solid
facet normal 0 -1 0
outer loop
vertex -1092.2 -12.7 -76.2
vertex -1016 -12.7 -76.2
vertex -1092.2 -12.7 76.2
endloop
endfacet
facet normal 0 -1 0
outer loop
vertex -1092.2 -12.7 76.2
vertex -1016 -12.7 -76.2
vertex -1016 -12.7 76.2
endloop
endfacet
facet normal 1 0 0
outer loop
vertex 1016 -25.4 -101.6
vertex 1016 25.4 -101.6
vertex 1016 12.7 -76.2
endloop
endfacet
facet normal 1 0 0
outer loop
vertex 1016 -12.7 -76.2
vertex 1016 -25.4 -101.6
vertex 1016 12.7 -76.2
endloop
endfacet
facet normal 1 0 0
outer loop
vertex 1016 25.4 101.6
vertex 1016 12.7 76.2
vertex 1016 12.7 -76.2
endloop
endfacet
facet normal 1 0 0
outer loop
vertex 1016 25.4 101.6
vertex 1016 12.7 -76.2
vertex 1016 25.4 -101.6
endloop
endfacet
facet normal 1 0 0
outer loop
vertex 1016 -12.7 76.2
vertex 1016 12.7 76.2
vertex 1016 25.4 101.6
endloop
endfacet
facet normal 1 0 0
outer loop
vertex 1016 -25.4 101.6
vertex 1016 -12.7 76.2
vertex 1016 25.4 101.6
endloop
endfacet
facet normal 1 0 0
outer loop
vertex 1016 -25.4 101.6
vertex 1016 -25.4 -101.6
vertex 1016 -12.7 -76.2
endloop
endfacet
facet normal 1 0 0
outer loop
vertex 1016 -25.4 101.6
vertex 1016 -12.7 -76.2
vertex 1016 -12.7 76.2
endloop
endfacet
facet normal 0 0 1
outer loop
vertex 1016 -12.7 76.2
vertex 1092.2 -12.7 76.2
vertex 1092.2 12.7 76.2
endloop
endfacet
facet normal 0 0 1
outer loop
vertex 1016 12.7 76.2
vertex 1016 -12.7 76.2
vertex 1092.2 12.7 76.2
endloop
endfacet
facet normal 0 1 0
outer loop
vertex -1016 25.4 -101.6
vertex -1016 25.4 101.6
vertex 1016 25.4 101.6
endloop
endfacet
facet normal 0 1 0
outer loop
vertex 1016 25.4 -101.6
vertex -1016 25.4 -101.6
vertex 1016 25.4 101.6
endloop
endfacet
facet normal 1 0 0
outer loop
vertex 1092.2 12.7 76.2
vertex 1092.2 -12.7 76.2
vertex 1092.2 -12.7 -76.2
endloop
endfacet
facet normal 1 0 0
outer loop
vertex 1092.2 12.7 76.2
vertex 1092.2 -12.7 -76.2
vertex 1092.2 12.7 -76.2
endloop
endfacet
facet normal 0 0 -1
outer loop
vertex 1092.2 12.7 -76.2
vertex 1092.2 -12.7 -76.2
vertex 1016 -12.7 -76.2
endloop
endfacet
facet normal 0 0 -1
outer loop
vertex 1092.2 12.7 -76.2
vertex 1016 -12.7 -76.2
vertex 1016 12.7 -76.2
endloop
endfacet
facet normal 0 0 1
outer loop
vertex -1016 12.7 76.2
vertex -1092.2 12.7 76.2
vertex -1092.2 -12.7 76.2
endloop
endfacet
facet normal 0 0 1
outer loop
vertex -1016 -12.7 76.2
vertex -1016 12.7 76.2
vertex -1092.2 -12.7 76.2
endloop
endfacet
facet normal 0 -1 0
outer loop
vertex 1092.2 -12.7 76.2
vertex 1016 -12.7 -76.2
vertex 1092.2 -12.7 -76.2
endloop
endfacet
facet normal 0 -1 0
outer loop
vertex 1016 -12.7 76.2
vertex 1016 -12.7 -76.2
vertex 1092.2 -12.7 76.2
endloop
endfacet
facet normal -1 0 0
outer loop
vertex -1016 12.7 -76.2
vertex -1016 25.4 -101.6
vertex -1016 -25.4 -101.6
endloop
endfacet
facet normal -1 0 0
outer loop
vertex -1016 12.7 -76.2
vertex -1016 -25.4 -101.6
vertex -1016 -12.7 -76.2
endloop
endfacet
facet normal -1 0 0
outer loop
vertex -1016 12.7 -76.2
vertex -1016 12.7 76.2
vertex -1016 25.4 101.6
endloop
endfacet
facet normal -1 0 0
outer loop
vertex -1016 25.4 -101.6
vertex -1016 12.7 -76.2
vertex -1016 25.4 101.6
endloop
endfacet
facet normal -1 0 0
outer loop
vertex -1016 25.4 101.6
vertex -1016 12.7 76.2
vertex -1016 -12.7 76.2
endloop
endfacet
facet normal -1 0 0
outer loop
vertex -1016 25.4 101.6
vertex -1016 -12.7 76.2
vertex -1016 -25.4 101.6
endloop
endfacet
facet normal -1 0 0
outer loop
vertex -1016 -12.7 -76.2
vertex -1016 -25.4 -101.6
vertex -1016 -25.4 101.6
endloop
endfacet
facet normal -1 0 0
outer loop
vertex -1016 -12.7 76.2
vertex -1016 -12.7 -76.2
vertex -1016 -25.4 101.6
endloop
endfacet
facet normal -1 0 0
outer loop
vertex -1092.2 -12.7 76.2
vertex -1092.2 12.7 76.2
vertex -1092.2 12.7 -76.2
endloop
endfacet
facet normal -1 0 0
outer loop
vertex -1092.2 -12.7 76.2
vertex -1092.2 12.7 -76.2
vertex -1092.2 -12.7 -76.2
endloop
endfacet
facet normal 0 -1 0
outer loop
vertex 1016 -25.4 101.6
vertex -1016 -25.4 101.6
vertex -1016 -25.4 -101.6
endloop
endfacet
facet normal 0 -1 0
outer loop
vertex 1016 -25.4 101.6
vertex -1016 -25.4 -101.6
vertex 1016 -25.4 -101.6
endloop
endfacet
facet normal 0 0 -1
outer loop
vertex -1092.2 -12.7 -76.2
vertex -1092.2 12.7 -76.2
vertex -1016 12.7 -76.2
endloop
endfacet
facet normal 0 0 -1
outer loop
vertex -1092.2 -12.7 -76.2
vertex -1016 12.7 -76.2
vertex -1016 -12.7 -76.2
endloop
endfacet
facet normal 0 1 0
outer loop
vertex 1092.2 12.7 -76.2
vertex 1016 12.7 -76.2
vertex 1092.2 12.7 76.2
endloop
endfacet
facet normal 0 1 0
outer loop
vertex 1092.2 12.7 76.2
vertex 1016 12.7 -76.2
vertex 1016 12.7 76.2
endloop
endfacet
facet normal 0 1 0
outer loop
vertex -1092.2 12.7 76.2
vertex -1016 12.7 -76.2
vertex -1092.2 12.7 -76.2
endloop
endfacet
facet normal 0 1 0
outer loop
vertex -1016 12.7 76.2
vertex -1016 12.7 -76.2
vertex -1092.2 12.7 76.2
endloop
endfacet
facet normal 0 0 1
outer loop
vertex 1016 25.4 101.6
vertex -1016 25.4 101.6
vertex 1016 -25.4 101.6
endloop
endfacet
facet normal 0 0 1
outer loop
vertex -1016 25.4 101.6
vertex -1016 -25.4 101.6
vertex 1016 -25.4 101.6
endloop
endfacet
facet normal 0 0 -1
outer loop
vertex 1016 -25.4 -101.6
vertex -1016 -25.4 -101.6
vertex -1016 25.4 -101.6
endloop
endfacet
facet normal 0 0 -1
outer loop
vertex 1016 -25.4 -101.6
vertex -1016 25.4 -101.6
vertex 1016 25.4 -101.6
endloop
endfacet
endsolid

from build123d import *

# Parameters (mm, degrees)
F0_W          = 2032
F0_H          = 203.2
F1_DEPTH      = 25.4
F1_DEPTH_BACK = 25.4
F2_W          = 25.4
F2_H          = 152.4
F3_DEPTH      = 76.2
F4_W          = 25.4
F4_H          = 152.4
F5_DEPTH      = 76.2


with BuildPart() as f1:
    # F0 (on Front) → F1 (new body, two sides)
    with BuildSketch(Plane.XZ) as f1_sk:
        Rectangle(F0_W, F0_H)
    extrude(amount=F1_DEPTH)
    extrude(f1_sk.sketch, amount=-F1_DEPTH_BACK)

    # F2 (on face) → F3 (join)
    with BuildSketch(Plane.YZ.offset(1016)):
        Rectangle(F2_W, F2_H)
    extrude(amount=F3_DEPTH)

    # F4 (on face) → F5 (join)
    with BuildSketch(Plane(origin=(-1016, 0, 0), x_dir=(0, -1, 0), z_dir=(-1, 0, 0))):
        Rectangle(F4_W, F4_H)
    extrude(amount=F5_DEPTH)


solid = f1.part
